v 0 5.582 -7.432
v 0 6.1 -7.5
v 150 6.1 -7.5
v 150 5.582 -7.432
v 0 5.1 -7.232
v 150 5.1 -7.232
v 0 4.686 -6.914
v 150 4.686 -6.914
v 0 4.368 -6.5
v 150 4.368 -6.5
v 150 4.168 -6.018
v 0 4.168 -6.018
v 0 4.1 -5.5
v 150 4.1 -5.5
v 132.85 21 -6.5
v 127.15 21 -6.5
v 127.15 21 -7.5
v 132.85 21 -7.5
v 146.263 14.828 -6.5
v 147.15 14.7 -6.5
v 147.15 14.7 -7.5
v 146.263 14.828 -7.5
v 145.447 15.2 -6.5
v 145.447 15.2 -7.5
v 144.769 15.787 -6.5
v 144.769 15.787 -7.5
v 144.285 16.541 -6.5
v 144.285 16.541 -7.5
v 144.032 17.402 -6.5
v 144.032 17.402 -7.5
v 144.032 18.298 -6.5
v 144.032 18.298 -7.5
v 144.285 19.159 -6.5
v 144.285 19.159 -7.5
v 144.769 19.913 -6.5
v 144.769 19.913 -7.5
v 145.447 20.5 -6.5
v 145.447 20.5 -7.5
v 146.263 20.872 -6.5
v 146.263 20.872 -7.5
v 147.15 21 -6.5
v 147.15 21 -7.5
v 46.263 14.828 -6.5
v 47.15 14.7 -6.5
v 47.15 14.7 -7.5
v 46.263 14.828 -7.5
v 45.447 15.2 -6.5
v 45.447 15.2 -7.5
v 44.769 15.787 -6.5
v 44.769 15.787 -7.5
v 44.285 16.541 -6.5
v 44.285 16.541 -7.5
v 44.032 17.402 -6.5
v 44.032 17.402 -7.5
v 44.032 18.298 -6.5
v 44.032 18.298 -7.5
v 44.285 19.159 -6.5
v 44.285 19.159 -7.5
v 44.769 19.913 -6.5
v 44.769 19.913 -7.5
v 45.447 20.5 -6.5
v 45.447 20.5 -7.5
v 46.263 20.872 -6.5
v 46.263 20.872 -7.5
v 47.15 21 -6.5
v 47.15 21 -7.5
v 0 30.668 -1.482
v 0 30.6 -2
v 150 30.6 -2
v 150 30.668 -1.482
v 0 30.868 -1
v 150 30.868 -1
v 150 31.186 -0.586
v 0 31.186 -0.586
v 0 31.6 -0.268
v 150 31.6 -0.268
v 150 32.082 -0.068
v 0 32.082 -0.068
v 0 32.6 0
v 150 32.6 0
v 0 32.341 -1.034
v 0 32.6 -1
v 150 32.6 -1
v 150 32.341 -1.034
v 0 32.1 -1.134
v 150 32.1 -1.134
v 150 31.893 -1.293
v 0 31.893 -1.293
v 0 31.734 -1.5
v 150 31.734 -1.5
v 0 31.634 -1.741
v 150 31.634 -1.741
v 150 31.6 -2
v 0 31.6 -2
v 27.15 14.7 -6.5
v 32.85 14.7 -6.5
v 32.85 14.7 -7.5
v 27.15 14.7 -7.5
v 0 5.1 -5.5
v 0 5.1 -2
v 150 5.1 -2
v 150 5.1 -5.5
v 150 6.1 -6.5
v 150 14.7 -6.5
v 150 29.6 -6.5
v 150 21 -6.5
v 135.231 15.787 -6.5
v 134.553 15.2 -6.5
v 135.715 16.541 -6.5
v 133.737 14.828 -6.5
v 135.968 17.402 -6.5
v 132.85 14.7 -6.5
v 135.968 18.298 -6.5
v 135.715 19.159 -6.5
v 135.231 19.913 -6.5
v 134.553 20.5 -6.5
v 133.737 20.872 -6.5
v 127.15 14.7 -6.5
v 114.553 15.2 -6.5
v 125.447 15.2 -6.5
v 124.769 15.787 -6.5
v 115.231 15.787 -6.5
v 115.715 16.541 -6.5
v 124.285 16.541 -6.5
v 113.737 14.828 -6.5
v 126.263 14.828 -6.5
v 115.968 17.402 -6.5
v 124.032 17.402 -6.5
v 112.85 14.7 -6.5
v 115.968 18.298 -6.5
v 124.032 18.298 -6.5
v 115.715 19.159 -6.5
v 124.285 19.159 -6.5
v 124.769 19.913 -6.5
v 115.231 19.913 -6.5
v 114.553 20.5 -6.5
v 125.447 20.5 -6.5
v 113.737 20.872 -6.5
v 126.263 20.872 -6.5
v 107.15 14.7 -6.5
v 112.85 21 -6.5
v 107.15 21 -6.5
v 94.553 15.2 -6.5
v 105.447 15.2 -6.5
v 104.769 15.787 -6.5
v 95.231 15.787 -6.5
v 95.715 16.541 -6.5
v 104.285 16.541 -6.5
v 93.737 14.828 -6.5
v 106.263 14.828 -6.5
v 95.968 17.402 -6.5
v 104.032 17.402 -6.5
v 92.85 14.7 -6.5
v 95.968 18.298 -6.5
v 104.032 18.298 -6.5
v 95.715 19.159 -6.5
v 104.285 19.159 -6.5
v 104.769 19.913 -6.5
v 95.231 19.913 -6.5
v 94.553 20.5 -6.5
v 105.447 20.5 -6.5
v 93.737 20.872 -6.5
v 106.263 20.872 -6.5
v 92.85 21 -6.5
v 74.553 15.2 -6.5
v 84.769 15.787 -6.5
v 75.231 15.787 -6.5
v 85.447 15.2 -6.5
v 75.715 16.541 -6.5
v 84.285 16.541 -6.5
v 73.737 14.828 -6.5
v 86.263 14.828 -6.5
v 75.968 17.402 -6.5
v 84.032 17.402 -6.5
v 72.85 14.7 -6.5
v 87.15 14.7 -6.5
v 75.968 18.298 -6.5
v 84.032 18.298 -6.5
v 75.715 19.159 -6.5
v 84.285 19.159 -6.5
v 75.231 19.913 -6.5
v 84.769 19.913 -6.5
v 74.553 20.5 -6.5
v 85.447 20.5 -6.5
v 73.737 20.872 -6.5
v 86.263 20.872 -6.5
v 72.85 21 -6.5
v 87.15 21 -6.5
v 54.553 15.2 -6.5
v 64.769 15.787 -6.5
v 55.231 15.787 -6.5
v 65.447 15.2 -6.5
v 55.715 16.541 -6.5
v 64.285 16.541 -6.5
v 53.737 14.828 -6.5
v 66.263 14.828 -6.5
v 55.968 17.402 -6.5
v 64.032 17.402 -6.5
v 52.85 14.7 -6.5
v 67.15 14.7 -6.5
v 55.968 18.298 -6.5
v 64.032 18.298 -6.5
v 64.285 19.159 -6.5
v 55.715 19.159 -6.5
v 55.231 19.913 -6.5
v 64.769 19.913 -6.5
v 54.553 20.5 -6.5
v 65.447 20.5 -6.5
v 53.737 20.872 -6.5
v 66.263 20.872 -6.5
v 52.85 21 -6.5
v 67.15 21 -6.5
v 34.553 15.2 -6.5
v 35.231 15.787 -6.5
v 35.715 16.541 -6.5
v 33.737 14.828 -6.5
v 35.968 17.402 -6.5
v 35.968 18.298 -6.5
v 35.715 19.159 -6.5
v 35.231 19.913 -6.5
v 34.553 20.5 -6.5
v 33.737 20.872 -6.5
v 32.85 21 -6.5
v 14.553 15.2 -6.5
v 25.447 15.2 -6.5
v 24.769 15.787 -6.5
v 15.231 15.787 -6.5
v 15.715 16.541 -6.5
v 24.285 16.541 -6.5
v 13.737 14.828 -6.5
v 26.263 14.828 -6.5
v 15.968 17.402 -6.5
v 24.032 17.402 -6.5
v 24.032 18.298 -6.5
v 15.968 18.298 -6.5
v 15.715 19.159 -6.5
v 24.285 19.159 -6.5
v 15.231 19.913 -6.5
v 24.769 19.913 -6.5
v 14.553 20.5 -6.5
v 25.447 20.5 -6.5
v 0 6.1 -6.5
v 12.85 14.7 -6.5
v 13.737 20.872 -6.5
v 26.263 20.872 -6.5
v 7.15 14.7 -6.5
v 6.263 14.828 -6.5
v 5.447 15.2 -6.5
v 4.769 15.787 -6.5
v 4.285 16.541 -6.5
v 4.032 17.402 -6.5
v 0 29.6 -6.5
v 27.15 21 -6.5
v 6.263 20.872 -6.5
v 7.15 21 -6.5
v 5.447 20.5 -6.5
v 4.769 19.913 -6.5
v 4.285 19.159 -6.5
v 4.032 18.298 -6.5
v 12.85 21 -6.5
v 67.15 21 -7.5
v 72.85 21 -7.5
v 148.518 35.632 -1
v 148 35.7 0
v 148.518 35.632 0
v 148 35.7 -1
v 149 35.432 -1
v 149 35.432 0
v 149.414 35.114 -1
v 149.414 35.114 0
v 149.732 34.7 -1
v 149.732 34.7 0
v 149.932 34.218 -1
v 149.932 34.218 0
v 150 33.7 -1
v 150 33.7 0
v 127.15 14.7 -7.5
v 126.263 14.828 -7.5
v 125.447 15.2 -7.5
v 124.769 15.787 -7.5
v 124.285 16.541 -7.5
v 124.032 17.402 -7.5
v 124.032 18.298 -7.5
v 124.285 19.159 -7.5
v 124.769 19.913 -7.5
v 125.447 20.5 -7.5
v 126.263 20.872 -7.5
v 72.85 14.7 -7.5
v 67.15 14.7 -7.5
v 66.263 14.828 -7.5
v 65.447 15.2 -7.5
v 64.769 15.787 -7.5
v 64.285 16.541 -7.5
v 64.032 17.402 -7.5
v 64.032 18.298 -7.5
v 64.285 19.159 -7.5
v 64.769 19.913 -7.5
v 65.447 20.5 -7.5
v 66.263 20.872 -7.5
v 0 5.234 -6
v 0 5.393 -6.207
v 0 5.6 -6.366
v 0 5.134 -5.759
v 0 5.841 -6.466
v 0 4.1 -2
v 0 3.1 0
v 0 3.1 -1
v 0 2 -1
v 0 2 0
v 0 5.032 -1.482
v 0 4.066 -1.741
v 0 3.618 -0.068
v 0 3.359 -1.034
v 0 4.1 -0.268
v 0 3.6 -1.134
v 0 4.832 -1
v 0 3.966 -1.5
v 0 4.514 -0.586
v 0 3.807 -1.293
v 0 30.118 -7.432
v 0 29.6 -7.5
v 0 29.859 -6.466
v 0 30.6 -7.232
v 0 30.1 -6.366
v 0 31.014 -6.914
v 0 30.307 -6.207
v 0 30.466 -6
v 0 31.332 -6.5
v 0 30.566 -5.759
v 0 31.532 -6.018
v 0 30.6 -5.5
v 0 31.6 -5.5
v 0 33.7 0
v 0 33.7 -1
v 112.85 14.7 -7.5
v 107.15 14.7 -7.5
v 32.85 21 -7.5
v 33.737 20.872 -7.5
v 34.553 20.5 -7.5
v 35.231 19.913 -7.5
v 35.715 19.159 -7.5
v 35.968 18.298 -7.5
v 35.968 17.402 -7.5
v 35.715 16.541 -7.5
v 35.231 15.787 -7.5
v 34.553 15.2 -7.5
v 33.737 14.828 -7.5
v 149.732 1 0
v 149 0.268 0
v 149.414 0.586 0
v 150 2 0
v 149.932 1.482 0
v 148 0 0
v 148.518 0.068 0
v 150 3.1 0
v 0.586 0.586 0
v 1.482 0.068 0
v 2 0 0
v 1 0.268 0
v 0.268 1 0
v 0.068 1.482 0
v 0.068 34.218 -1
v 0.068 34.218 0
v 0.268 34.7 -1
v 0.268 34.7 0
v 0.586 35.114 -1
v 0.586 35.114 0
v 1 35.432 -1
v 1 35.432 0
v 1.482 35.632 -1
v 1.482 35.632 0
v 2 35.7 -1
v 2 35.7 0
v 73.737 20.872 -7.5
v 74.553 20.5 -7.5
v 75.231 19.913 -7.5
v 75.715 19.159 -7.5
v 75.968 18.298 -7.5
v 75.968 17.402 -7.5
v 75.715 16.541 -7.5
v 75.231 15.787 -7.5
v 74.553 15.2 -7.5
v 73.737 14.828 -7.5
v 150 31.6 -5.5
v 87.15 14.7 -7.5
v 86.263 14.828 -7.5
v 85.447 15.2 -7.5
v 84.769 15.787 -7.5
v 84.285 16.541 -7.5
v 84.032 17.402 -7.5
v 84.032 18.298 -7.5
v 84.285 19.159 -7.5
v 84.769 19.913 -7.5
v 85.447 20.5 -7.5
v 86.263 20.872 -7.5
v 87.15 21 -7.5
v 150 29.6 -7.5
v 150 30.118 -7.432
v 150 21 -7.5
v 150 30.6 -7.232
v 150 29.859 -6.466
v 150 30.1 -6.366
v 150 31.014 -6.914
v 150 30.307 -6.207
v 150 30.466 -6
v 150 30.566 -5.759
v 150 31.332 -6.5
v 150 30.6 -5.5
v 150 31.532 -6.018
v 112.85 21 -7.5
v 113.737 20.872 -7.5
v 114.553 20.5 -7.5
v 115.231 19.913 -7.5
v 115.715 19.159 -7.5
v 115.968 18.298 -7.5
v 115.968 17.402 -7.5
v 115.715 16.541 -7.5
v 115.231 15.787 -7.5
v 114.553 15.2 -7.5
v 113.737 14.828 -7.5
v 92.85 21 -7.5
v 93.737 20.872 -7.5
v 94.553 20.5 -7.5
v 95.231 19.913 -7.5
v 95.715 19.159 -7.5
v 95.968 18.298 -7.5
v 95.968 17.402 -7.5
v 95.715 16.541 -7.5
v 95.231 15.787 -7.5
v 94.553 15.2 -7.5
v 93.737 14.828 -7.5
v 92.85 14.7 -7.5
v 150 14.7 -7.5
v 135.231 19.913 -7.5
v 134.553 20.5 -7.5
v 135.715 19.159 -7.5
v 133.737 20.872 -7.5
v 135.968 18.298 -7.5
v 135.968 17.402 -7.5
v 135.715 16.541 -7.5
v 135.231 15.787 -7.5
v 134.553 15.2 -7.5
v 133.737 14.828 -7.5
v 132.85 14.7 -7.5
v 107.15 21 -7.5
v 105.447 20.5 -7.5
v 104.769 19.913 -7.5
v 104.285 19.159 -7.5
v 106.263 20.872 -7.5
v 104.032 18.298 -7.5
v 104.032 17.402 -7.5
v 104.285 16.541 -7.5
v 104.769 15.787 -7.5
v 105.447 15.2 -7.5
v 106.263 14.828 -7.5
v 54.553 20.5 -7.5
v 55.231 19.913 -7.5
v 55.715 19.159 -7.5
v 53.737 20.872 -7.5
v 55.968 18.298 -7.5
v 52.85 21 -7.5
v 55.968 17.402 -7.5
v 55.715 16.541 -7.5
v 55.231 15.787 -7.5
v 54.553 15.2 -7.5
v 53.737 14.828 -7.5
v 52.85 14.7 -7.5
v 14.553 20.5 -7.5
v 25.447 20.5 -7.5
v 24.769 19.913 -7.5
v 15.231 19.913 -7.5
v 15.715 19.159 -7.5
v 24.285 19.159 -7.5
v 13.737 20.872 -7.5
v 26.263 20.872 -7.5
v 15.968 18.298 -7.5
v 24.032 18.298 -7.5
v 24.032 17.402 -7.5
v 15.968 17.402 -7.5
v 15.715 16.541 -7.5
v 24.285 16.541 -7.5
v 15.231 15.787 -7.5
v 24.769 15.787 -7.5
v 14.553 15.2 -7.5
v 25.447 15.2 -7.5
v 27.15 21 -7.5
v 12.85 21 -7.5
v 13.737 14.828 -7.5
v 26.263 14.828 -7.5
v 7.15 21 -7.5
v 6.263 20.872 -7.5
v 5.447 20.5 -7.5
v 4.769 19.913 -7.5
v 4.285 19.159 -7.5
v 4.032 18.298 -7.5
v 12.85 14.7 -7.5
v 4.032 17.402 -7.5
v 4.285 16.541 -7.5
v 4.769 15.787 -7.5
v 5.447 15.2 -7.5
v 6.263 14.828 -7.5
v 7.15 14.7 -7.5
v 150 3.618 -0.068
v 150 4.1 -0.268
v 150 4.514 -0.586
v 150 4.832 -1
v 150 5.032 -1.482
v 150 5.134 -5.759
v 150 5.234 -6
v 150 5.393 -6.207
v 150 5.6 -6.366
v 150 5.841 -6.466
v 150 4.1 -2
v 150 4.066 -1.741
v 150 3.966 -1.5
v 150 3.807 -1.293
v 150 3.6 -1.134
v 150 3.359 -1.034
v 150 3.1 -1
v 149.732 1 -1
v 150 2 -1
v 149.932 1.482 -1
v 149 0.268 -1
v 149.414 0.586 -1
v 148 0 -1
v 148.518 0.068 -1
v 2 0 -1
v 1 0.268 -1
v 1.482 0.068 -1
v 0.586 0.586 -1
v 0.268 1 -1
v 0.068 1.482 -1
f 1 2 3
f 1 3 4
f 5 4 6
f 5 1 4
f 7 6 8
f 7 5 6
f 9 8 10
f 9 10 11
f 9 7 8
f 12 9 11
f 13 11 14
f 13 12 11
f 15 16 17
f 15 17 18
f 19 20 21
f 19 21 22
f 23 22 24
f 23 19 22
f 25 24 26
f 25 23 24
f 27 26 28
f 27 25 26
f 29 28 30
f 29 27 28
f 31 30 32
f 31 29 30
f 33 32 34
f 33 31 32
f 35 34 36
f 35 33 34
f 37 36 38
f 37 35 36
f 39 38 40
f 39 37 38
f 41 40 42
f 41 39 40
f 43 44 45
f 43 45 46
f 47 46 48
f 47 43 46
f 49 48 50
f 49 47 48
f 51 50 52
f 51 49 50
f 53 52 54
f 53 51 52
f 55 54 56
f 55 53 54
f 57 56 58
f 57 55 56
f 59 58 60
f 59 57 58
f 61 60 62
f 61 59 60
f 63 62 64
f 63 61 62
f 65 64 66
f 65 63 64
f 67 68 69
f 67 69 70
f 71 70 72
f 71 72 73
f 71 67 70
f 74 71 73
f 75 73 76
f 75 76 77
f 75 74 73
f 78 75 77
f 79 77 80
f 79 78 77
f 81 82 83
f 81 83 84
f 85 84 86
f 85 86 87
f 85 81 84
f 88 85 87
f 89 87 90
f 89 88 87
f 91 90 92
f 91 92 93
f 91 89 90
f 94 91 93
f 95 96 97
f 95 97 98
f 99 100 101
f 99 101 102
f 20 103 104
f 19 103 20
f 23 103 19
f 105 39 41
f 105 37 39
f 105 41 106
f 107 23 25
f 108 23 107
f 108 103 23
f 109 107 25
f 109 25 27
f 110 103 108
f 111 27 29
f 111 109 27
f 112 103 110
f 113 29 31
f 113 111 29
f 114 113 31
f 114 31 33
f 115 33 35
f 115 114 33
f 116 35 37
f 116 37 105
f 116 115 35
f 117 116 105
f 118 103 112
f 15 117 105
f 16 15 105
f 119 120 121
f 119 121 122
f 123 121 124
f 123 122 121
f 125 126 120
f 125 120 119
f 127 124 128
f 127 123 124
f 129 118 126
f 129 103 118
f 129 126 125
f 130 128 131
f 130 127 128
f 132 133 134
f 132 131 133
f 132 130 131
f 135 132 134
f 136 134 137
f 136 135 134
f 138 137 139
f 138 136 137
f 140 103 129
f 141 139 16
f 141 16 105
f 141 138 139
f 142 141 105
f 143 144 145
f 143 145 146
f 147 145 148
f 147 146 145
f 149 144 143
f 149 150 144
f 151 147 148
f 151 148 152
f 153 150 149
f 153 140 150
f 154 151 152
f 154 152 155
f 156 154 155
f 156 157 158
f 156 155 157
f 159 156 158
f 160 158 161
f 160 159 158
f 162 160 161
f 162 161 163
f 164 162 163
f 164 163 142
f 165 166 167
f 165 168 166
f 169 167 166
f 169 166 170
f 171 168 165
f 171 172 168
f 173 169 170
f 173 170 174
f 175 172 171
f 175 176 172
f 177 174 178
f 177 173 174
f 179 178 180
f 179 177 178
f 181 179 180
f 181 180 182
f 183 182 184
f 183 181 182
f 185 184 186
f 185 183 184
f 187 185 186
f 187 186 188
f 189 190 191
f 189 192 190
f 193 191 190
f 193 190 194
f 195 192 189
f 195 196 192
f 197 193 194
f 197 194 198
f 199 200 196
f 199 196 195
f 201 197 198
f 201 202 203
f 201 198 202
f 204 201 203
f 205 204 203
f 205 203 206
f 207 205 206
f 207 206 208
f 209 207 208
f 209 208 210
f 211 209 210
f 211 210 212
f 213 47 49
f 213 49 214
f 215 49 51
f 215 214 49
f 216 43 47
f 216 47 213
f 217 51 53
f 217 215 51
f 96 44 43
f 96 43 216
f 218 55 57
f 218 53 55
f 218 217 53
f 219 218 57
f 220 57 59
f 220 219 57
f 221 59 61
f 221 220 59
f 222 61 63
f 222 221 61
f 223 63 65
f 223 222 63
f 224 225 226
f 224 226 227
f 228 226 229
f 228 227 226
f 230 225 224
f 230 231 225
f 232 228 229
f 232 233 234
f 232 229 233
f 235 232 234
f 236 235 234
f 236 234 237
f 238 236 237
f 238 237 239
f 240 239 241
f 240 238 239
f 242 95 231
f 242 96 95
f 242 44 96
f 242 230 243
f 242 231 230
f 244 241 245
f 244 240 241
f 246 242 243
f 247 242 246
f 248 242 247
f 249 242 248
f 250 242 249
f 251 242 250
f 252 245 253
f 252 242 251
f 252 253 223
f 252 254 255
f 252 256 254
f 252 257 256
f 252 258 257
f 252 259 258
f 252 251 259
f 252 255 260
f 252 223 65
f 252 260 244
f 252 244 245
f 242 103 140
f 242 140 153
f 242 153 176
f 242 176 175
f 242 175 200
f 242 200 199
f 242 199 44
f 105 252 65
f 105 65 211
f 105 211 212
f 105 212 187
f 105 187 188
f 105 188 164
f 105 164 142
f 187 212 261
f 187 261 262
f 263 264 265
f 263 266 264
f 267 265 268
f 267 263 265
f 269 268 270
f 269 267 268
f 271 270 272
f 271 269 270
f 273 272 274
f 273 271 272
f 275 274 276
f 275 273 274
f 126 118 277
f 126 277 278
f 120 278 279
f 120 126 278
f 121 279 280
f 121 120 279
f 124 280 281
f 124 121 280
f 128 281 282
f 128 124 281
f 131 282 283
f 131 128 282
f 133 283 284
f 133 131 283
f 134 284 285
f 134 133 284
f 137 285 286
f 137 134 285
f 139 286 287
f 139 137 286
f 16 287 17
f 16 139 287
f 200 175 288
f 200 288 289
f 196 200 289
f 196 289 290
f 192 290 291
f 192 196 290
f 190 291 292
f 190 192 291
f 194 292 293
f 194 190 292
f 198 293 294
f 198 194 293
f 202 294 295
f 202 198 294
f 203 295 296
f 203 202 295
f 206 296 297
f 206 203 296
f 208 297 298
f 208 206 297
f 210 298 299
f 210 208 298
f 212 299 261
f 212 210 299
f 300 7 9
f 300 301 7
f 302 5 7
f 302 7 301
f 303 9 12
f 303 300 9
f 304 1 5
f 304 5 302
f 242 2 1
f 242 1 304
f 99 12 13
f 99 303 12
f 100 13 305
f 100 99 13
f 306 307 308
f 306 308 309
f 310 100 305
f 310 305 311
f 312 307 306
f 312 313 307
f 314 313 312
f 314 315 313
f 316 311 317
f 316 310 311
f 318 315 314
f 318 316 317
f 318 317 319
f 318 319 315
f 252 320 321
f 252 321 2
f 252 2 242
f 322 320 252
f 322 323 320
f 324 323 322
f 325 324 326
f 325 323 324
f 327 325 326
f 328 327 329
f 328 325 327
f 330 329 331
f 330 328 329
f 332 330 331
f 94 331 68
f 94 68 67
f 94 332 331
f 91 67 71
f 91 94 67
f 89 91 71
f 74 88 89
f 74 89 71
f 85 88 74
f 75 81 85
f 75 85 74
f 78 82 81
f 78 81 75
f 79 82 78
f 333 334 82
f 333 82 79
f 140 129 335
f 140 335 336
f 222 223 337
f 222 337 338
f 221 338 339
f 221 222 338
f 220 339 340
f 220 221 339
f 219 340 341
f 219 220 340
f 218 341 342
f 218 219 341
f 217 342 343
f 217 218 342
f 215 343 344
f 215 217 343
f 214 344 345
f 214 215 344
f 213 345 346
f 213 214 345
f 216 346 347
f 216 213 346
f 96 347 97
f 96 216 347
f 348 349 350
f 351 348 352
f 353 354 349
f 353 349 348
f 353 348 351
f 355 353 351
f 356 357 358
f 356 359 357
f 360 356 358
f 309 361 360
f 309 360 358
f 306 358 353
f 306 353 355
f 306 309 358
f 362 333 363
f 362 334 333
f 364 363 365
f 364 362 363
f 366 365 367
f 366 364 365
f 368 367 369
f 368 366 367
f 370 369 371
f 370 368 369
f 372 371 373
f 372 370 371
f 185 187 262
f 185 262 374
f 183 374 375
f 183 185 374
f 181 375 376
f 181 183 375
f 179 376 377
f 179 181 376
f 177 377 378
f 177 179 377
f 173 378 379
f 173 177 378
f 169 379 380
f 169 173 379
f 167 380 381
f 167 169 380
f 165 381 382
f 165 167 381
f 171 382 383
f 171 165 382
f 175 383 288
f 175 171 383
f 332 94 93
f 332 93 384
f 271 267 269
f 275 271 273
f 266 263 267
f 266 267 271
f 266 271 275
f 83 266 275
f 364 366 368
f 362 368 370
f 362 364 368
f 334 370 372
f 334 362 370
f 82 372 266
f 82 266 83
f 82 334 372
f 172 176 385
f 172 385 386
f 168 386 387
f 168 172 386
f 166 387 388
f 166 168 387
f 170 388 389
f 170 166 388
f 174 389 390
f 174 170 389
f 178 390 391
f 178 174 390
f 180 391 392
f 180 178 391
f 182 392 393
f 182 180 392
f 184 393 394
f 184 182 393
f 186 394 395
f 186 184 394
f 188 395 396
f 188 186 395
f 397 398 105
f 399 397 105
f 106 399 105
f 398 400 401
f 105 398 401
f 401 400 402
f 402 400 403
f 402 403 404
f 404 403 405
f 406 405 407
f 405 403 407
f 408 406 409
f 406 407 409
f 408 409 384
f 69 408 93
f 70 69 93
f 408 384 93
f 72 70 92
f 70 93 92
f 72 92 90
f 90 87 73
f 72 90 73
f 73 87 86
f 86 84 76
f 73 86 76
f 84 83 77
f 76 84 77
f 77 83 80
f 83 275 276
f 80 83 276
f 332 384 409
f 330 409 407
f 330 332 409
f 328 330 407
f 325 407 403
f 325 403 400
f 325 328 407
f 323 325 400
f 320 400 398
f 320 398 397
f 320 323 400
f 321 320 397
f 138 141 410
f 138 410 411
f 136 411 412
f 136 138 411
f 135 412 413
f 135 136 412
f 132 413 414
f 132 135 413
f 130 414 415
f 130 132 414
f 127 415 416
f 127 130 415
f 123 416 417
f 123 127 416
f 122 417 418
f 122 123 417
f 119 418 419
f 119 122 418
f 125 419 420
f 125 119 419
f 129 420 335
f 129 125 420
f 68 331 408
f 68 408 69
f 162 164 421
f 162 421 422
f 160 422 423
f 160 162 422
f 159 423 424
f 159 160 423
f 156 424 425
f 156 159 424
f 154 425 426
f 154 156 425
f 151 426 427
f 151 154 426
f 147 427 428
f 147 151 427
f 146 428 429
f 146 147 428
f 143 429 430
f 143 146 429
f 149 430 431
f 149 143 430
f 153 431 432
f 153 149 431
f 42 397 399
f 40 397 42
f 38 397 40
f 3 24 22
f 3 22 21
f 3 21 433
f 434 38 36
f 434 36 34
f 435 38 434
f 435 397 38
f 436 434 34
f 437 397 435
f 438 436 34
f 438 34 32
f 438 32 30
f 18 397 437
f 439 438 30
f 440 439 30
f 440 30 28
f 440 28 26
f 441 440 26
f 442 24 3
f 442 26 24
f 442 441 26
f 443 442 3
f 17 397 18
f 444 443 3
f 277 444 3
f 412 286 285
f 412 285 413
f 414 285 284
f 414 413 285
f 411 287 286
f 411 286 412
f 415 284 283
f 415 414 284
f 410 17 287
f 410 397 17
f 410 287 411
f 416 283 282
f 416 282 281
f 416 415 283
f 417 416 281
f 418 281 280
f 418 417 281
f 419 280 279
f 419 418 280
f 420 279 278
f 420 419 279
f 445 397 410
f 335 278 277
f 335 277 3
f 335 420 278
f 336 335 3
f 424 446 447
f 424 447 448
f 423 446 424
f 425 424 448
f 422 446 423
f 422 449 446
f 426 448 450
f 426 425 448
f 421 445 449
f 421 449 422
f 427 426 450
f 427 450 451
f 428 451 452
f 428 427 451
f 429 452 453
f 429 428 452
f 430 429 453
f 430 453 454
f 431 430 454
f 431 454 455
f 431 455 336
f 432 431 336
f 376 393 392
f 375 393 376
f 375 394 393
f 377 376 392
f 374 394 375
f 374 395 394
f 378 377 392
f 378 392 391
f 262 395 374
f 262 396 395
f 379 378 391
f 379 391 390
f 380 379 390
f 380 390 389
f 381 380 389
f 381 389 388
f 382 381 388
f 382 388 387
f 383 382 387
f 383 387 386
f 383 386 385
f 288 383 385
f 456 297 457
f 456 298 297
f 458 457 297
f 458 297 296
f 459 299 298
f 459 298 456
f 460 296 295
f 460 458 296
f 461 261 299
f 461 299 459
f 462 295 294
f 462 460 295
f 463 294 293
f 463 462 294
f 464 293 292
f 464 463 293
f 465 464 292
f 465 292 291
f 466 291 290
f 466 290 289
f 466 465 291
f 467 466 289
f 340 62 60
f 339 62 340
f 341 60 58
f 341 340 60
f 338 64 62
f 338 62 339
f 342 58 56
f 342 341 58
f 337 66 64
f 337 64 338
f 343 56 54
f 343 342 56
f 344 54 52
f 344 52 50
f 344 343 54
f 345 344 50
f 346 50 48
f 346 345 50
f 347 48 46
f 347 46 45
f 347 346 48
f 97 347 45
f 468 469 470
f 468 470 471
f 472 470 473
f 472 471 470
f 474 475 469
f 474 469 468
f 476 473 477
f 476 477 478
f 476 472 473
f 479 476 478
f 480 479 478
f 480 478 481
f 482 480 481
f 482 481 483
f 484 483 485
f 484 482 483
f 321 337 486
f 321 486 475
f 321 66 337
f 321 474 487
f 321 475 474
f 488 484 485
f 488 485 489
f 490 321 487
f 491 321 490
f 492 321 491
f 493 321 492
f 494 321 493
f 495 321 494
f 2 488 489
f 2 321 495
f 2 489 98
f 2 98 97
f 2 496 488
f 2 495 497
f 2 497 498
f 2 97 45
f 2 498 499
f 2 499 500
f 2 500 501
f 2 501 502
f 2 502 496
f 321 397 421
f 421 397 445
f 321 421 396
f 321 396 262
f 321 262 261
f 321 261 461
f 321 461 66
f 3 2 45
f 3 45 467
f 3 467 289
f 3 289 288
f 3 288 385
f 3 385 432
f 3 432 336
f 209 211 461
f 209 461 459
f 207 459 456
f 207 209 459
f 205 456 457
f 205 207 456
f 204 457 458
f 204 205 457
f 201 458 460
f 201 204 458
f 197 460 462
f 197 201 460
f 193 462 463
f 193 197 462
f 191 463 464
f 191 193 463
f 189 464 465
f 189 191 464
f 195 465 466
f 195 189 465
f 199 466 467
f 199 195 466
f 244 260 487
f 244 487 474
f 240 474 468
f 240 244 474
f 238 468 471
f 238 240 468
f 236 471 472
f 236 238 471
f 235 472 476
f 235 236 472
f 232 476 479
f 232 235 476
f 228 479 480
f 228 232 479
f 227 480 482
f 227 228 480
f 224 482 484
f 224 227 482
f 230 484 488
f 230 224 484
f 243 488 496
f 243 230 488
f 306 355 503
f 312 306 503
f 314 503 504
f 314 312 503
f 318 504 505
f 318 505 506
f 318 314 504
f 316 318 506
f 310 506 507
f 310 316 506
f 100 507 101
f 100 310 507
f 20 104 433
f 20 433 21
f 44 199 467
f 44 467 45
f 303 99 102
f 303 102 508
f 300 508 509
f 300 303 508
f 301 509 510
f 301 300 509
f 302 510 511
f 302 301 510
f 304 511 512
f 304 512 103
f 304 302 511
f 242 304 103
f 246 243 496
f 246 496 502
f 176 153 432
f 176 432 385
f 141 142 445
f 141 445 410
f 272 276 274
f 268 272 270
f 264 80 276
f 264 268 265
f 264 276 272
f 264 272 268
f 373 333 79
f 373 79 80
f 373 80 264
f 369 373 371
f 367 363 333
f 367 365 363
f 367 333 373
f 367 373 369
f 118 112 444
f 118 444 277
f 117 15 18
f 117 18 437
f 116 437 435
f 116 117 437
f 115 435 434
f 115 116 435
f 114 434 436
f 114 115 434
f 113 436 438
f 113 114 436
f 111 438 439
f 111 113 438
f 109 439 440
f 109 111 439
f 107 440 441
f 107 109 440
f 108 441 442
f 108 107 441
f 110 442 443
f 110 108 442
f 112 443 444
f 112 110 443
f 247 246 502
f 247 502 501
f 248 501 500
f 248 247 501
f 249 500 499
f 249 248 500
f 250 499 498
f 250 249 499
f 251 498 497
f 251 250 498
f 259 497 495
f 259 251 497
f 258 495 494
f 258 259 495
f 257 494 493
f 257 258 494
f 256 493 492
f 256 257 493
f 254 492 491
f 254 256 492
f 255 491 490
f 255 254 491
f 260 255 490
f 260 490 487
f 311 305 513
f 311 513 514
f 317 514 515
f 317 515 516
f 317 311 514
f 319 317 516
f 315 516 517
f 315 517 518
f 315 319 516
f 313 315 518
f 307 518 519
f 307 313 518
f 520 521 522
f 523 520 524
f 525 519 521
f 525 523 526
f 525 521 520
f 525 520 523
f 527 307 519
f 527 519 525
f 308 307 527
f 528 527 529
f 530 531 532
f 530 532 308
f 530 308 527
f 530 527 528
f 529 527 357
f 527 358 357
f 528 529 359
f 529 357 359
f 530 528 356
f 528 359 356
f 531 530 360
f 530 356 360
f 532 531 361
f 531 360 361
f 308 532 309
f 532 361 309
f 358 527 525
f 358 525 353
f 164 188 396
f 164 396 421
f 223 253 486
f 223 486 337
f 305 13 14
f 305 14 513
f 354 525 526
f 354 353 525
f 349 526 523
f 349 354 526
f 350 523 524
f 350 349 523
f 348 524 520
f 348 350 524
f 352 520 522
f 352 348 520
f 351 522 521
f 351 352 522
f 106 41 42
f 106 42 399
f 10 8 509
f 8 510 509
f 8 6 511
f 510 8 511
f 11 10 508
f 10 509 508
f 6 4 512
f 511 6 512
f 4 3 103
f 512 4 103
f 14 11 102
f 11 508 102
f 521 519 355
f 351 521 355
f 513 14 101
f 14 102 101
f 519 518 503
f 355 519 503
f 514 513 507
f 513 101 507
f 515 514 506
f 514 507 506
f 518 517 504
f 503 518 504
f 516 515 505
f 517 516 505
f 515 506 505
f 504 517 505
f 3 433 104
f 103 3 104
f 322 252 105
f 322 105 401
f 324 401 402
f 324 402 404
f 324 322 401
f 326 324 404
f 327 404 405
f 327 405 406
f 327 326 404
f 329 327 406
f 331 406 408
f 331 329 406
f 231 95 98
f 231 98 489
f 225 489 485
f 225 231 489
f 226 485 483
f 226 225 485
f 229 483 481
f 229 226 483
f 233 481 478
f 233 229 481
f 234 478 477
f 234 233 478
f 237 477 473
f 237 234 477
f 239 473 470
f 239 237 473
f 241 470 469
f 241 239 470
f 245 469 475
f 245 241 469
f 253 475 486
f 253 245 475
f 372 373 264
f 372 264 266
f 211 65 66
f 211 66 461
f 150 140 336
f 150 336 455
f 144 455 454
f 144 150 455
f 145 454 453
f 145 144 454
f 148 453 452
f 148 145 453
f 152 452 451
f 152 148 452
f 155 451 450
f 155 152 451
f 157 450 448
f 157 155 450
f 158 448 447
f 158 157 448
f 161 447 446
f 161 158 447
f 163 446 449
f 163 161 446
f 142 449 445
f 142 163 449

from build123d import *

# Parameters (mm, degrees)
BOSS_EXTRUDE1_DEPTH = 150
CUT_EXTRUDE1_DEPTH  = 155.372082968
LPATTERN1_COUNT     = 8
LPATTERN1_PITCH     = 20
FILLET1_R           = 2


with BuildPart() as part:
    # Sketch1 → Boss-Extrude1 (new body)
    with BuildSketch(Plane(origin=(0, 0, 0), x_dir=(0, 0, -1), z_dir=(1, 0, 0))):
        with BuildLine():
            Line((0, 0), (0, 3.1))
            ThreePointArc((0, 3.1), (0.585786438, 4.514213562), (2, 5.1))
            Line((2, 5.1), (5.5, 5.1))
            ThreePointArc((5.5, 5.1), (6.207106781, 5.392893219), (6.5, 6.1))
            Line((6.5, 6.1), (6.5, 29.6))
            ThreePointArc((6.5, 29.6), (6.207106781, 30.307106781), (5.5, 30.6))
            Line((5.5, 30.6), (2, 30.6))
            ThreePointArc((2, 30.6), (0.585786438, 31.185786438), (0, 32.6))
            Line((0, 32.6), (0, 35.7))
            Line((0, 35.7), (1, 35.7))
            Line((1, 35.7), (1, 32.6))
            ThreePointArc((1, 32.6), (1.292893219, 31.892893219), (2, 31.6))
            Line((2, 31.6), (5.5, 31.6))
            ThreePointArc((5.5, 31.6), (6.914213562, 31.014213562), (7.5, 29.6))
            Line((7.5, 29.6), (7.5, 6.1))
            ThreePointArc((7.5, 6.1), (6.914213562, 4.685786438), (5.5, 4.1))
            Line((5.5, 4.1), (2, 4.1))
            ThreePointArc((2, 4.1), (1.292893219, 3.807106781), (1, 3.1))
            Line((1, 3.1), (1, 0))
            Line((1, 0), (0, 0))
        make_face()
    extrude(amount=BOSS_EXTRUDE1_DEPTH)

    # Sketch2 → Cut-Extrude1 (cut, through all)
    with BuildSketch(Plane.XY):
        with BuildLine():
            Line((7.15, 21), (12.85, 21))
            ThreePointArc((12.85, 21), (16, 17.85), (12.85, 14.7))
            Line((12.85, 14.7), (7.15, 14.7))
            ThreePointArc((7.15, 14.7), (4, 17.85), (7.15, 21))
        make_face()
    cut_extrude1 = extrude(amount=-CUT_EXTRUDE1_DEPTH, mode=Mode.SUBTRACT)

    # LPattern1: Cut-Extrude1 ×8
    with Locations(*[(i * LPATTERN1_PITCH, 0, 0) for i in range(1, LPATTERN1_COUNT)]):
        add(cut_extrude1, mode=Mode.SUBTRACT)

    # Fillet1
    fillet1_edges = [part.edges().sort_by_distance(p)[0] for p in [
        (0, 35.7, -0.5),
        (0, 0, -0.5),
        (150, 35.7, -0.5),
        (150, 0, -0.5),
    ]]
    fillet(fillet1_edges, radius=FILLET1_R)


solid = part.part
